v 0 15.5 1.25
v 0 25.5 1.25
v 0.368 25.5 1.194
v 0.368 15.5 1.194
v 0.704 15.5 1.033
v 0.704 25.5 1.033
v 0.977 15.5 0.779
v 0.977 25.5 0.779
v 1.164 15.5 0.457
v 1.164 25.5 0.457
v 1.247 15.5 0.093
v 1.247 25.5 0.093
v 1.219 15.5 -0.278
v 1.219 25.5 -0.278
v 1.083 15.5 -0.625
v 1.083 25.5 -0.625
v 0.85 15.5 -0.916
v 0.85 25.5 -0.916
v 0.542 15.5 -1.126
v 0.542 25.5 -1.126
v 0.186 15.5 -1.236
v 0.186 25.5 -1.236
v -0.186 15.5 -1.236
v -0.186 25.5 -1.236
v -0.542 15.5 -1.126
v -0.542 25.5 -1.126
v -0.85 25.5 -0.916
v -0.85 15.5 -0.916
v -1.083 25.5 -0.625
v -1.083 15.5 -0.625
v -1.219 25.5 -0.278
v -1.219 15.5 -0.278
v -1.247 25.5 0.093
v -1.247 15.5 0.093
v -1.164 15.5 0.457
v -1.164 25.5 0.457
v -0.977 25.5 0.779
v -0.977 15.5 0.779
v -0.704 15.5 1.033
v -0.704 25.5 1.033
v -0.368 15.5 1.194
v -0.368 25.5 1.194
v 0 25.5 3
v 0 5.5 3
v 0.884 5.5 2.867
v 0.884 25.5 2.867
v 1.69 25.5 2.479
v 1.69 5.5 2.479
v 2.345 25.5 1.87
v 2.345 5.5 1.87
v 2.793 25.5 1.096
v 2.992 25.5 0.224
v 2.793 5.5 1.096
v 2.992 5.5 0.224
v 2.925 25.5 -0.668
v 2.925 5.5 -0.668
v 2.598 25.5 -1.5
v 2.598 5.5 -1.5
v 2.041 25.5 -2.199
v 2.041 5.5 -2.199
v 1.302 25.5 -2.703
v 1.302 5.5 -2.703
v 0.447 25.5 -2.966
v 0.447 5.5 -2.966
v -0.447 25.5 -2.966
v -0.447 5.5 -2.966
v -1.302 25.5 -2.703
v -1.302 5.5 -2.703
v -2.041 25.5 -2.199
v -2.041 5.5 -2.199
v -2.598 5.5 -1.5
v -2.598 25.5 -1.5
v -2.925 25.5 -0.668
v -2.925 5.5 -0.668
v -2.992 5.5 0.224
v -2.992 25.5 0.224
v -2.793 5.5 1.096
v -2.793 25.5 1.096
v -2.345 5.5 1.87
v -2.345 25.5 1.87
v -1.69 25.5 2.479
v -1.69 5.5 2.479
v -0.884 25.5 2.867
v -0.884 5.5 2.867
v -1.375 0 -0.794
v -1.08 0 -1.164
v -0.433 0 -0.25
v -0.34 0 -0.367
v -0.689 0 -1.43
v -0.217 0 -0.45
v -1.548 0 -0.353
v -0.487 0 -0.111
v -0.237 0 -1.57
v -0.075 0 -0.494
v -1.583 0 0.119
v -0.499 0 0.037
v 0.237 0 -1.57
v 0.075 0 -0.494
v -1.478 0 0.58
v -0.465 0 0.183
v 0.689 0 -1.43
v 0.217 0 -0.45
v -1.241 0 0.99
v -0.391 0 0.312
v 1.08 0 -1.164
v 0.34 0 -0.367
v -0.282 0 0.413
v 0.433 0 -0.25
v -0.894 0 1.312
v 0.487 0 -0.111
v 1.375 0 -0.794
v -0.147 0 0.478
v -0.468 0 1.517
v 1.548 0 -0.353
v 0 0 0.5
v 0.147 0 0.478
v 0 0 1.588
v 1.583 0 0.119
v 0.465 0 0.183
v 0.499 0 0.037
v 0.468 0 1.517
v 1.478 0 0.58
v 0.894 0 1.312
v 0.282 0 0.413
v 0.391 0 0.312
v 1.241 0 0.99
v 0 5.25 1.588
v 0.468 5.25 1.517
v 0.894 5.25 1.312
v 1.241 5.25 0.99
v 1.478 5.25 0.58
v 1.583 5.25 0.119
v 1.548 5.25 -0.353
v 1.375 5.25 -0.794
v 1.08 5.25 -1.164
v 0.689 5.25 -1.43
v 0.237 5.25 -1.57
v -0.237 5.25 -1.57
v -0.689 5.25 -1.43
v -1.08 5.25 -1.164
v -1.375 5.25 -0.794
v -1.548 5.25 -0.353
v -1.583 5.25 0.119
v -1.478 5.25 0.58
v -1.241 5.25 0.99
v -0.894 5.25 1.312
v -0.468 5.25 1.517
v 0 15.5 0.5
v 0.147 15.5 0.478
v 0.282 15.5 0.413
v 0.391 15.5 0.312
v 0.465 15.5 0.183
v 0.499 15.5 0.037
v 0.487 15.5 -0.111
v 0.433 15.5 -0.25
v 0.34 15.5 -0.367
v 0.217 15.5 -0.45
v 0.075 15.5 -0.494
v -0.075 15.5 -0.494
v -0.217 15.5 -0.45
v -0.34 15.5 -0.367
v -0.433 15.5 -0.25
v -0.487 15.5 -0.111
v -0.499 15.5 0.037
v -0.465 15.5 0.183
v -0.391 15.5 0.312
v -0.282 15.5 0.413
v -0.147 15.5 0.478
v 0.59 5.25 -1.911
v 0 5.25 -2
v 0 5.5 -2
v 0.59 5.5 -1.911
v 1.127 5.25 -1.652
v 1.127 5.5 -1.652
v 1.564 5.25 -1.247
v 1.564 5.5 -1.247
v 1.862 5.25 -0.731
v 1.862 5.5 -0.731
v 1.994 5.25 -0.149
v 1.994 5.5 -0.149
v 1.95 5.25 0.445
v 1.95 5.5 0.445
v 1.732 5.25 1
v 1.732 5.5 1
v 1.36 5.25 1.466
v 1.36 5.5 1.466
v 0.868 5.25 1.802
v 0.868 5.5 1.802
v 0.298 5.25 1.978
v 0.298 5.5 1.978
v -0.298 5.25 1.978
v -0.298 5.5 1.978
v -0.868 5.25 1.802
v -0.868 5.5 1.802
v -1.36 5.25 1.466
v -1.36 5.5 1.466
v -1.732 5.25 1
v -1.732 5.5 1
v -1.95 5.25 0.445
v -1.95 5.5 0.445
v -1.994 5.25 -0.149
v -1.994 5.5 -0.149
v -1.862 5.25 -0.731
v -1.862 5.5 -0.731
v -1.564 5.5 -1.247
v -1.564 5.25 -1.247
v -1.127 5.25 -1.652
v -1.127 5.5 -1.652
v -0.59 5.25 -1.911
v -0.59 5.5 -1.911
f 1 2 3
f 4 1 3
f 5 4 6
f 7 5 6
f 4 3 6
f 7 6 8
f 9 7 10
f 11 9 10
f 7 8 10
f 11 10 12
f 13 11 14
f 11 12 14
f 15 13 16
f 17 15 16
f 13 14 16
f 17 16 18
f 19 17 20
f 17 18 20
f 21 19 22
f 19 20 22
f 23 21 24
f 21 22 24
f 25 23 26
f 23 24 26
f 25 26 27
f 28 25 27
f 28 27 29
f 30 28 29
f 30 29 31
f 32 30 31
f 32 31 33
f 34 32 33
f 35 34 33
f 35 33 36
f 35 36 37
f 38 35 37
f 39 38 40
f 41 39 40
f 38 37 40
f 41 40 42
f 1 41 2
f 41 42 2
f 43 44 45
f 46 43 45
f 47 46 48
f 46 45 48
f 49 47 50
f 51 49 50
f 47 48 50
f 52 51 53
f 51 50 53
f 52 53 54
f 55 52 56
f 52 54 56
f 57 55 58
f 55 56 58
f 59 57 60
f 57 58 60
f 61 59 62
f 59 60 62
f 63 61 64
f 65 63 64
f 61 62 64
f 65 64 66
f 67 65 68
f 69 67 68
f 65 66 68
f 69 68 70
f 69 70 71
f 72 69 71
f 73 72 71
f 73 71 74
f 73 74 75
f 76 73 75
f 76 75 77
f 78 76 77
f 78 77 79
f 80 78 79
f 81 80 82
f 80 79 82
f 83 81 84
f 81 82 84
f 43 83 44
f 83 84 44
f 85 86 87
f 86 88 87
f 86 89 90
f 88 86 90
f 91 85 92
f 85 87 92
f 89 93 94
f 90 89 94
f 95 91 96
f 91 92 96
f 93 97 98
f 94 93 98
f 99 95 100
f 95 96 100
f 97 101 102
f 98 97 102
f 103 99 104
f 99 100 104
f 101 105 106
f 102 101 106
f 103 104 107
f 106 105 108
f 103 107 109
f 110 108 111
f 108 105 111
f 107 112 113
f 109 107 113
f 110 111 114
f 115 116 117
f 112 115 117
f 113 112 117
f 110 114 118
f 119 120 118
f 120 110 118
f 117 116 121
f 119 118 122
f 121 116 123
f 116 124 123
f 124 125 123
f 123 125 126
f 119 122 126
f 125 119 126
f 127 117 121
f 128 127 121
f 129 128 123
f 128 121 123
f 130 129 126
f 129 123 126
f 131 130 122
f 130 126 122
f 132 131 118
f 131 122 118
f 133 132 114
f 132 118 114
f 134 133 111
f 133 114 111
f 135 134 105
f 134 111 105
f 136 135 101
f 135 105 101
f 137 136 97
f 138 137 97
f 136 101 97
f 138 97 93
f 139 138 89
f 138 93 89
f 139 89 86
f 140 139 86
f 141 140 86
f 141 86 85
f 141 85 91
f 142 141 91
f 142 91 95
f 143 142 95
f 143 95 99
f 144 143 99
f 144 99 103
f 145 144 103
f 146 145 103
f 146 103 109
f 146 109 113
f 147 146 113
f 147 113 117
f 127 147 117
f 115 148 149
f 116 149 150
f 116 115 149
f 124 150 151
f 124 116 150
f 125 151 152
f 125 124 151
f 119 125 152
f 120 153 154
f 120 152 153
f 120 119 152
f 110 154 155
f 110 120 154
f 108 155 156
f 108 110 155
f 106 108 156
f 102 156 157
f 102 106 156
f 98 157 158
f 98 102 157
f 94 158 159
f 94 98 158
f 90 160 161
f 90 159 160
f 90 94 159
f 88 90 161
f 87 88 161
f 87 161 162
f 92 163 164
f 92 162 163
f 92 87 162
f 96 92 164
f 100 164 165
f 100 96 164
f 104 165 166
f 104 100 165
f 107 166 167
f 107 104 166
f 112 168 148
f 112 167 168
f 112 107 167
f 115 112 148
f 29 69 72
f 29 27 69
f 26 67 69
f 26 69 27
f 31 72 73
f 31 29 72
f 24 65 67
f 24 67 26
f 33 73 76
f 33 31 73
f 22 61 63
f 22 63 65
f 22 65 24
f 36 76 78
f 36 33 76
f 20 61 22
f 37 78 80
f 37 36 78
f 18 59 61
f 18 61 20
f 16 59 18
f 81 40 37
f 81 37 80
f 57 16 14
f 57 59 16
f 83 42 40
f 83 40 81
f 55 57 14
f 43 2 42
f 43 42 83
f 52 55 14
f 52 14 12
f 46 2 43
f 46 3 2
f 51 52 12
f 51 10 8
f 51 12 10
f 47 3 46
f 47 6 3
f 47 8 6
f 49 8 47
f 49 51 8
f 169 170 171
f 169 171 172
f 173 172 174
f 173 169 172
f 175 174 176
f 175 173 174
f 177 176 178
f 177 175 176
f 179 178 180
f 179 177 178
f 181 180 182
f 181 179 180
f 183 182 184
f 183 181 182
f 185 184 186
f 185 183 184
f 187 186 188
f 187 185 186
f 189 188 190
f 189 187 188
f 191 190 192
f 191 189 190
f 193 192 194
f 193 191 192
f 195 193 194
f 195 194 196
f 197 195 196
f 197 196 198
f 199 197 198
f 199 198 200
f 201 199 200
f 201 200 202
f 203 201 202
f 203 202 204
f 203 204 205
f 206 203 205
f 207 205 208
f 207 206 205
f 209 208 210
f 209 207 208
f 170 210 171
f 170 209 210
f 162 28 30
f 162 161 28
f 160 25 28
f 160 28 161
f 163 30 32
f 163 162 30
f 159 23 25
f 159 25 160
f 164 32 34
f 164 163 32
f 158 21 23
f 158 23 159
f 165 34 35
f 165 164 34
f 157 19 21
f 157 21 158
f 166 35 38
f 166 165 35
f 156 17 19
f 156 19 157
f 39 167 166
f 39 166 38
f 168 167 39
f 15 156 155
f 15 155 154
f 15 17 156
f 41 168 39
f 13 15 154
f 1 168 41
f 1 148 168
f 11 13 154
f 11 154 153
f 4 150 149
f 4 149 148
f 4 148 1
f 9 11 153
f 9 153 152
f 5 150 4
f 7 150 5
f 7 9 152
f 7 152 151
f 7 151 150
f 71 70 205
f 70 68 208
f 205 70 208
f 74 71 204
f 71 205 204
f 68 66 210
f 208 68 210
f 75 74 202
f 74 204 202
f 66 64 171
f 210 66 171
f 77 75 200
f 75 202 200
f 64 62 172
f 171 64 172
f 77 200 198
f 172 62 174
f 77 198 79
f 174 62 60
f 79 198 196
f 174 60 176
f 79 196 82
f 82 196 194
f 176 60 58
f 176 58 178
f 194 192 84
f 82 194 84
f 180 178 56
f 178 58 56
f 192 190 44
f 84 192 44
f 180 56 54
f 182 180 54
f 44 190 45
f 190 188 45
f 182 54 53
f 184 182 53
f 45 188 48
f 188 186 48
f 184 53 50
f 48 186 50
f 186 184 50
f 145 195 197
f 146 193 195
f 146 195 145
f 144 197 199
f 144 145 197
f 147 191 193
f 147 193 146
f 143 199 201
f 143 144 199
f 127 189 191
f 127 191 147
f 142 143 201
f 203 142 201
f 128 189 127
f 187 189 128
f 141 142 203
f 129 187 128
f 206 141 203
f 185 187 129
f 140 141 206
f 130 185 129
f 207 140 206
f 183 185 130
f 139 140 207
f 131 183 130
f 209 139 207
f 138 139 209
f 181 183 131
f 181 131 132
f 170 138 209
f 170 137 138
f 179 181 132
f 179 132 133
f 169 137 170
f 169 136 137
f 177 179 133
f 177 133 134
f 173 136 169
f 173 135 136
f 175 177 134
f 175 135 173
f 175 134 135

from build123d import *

# Parameters (mm, degrees)
SKETCH1_R           = 1.5875
SKETCH1_R_2         = 0.5
BOSS_EXTRUDE1_DEPTH = 5.5
SKETCH2_R           = 2
SKETCH2_R_2         = 1.5875
BOSS_EXTRUDE2_DEPTH = 0.25
SKETCH3_R           = 3
SKETCH3_R_2         = 0.5
BOSS_EXTRUDE3_DEPTH = 20
SKETCH4_R           = 1.25
CUT_EXTRUDE1_DEPTH  = 10


with BuildPart() as part:
    # Sketch1 → Boss-Extrude1 (new body)
    with BuildSketch(Plane(origin=(0, 0, 0), x_dir=(1, 0, 0), z_dir=(0, 1, 0))):
        with Locations(Location((0, 0, 0), (0, 0, 270))):
            Circle(SKETCH1_R)
        with Locations(Location((0, 0, 0), (0, 0, 270))):
            Circle(SKETCH1_R_2, mode=Mode.SUBTRACT)
    extrude(amount=BOSS_EXTRUDE1_DEPTH)

    # Sketch2 → Boss-Extrude2 (add)
    with BuildSketch(Plane(origin=(0, 5.25, 0), x_dir=(-1, 0, 0), z_dir=(0, -1, 0))):
        with Locations(Location((0, 0, 0), (0, 0, 90))):
            Circle(SKETCH2_R)
        with Locations(Location((0, 0, 0), (0, 0, 90))):
            Circle(SKETCH2_R_2, mode=Mode.SUBTRACT)
    extrude(amount=-BOSS_EXTRUDE2_DEPTH)

    # Sketch3 → Boss-Extrude3 (add)
    with BuildSketch(Plane(origin=(0, 5.5, 0), x_dir=(1, 0, 0), z_dir=(0, 1, 0))):
        with Locations(Location((0, 0, 0), (0, 0, 270))):
            Circle(SKETCH3_R)
        with Locations(Location((0, 0, 0), (0, 0, 270))):
            Circle(SKETCH3_R_2, mode=Mode.SUBTRACT)
    extrude(amount=BOSS_EXTRUDE3_DEPTH)

    # Sketch4 → Cut-Extrude1 (cut)
    with BuildSketch(Plane(origin=(0, 25.5, 0), x_dir=(1, 0, 0), z_dir=(0, 1, 0))):
        with Locations(Location((0, 0, 0), (0, 0, 270))):
            Circle(SKETCH4_R)
    extrude(amount=-CUT_EXTRUDE1_DEPTH, mode=Mode.SUBTRACT)


solid = part.part
